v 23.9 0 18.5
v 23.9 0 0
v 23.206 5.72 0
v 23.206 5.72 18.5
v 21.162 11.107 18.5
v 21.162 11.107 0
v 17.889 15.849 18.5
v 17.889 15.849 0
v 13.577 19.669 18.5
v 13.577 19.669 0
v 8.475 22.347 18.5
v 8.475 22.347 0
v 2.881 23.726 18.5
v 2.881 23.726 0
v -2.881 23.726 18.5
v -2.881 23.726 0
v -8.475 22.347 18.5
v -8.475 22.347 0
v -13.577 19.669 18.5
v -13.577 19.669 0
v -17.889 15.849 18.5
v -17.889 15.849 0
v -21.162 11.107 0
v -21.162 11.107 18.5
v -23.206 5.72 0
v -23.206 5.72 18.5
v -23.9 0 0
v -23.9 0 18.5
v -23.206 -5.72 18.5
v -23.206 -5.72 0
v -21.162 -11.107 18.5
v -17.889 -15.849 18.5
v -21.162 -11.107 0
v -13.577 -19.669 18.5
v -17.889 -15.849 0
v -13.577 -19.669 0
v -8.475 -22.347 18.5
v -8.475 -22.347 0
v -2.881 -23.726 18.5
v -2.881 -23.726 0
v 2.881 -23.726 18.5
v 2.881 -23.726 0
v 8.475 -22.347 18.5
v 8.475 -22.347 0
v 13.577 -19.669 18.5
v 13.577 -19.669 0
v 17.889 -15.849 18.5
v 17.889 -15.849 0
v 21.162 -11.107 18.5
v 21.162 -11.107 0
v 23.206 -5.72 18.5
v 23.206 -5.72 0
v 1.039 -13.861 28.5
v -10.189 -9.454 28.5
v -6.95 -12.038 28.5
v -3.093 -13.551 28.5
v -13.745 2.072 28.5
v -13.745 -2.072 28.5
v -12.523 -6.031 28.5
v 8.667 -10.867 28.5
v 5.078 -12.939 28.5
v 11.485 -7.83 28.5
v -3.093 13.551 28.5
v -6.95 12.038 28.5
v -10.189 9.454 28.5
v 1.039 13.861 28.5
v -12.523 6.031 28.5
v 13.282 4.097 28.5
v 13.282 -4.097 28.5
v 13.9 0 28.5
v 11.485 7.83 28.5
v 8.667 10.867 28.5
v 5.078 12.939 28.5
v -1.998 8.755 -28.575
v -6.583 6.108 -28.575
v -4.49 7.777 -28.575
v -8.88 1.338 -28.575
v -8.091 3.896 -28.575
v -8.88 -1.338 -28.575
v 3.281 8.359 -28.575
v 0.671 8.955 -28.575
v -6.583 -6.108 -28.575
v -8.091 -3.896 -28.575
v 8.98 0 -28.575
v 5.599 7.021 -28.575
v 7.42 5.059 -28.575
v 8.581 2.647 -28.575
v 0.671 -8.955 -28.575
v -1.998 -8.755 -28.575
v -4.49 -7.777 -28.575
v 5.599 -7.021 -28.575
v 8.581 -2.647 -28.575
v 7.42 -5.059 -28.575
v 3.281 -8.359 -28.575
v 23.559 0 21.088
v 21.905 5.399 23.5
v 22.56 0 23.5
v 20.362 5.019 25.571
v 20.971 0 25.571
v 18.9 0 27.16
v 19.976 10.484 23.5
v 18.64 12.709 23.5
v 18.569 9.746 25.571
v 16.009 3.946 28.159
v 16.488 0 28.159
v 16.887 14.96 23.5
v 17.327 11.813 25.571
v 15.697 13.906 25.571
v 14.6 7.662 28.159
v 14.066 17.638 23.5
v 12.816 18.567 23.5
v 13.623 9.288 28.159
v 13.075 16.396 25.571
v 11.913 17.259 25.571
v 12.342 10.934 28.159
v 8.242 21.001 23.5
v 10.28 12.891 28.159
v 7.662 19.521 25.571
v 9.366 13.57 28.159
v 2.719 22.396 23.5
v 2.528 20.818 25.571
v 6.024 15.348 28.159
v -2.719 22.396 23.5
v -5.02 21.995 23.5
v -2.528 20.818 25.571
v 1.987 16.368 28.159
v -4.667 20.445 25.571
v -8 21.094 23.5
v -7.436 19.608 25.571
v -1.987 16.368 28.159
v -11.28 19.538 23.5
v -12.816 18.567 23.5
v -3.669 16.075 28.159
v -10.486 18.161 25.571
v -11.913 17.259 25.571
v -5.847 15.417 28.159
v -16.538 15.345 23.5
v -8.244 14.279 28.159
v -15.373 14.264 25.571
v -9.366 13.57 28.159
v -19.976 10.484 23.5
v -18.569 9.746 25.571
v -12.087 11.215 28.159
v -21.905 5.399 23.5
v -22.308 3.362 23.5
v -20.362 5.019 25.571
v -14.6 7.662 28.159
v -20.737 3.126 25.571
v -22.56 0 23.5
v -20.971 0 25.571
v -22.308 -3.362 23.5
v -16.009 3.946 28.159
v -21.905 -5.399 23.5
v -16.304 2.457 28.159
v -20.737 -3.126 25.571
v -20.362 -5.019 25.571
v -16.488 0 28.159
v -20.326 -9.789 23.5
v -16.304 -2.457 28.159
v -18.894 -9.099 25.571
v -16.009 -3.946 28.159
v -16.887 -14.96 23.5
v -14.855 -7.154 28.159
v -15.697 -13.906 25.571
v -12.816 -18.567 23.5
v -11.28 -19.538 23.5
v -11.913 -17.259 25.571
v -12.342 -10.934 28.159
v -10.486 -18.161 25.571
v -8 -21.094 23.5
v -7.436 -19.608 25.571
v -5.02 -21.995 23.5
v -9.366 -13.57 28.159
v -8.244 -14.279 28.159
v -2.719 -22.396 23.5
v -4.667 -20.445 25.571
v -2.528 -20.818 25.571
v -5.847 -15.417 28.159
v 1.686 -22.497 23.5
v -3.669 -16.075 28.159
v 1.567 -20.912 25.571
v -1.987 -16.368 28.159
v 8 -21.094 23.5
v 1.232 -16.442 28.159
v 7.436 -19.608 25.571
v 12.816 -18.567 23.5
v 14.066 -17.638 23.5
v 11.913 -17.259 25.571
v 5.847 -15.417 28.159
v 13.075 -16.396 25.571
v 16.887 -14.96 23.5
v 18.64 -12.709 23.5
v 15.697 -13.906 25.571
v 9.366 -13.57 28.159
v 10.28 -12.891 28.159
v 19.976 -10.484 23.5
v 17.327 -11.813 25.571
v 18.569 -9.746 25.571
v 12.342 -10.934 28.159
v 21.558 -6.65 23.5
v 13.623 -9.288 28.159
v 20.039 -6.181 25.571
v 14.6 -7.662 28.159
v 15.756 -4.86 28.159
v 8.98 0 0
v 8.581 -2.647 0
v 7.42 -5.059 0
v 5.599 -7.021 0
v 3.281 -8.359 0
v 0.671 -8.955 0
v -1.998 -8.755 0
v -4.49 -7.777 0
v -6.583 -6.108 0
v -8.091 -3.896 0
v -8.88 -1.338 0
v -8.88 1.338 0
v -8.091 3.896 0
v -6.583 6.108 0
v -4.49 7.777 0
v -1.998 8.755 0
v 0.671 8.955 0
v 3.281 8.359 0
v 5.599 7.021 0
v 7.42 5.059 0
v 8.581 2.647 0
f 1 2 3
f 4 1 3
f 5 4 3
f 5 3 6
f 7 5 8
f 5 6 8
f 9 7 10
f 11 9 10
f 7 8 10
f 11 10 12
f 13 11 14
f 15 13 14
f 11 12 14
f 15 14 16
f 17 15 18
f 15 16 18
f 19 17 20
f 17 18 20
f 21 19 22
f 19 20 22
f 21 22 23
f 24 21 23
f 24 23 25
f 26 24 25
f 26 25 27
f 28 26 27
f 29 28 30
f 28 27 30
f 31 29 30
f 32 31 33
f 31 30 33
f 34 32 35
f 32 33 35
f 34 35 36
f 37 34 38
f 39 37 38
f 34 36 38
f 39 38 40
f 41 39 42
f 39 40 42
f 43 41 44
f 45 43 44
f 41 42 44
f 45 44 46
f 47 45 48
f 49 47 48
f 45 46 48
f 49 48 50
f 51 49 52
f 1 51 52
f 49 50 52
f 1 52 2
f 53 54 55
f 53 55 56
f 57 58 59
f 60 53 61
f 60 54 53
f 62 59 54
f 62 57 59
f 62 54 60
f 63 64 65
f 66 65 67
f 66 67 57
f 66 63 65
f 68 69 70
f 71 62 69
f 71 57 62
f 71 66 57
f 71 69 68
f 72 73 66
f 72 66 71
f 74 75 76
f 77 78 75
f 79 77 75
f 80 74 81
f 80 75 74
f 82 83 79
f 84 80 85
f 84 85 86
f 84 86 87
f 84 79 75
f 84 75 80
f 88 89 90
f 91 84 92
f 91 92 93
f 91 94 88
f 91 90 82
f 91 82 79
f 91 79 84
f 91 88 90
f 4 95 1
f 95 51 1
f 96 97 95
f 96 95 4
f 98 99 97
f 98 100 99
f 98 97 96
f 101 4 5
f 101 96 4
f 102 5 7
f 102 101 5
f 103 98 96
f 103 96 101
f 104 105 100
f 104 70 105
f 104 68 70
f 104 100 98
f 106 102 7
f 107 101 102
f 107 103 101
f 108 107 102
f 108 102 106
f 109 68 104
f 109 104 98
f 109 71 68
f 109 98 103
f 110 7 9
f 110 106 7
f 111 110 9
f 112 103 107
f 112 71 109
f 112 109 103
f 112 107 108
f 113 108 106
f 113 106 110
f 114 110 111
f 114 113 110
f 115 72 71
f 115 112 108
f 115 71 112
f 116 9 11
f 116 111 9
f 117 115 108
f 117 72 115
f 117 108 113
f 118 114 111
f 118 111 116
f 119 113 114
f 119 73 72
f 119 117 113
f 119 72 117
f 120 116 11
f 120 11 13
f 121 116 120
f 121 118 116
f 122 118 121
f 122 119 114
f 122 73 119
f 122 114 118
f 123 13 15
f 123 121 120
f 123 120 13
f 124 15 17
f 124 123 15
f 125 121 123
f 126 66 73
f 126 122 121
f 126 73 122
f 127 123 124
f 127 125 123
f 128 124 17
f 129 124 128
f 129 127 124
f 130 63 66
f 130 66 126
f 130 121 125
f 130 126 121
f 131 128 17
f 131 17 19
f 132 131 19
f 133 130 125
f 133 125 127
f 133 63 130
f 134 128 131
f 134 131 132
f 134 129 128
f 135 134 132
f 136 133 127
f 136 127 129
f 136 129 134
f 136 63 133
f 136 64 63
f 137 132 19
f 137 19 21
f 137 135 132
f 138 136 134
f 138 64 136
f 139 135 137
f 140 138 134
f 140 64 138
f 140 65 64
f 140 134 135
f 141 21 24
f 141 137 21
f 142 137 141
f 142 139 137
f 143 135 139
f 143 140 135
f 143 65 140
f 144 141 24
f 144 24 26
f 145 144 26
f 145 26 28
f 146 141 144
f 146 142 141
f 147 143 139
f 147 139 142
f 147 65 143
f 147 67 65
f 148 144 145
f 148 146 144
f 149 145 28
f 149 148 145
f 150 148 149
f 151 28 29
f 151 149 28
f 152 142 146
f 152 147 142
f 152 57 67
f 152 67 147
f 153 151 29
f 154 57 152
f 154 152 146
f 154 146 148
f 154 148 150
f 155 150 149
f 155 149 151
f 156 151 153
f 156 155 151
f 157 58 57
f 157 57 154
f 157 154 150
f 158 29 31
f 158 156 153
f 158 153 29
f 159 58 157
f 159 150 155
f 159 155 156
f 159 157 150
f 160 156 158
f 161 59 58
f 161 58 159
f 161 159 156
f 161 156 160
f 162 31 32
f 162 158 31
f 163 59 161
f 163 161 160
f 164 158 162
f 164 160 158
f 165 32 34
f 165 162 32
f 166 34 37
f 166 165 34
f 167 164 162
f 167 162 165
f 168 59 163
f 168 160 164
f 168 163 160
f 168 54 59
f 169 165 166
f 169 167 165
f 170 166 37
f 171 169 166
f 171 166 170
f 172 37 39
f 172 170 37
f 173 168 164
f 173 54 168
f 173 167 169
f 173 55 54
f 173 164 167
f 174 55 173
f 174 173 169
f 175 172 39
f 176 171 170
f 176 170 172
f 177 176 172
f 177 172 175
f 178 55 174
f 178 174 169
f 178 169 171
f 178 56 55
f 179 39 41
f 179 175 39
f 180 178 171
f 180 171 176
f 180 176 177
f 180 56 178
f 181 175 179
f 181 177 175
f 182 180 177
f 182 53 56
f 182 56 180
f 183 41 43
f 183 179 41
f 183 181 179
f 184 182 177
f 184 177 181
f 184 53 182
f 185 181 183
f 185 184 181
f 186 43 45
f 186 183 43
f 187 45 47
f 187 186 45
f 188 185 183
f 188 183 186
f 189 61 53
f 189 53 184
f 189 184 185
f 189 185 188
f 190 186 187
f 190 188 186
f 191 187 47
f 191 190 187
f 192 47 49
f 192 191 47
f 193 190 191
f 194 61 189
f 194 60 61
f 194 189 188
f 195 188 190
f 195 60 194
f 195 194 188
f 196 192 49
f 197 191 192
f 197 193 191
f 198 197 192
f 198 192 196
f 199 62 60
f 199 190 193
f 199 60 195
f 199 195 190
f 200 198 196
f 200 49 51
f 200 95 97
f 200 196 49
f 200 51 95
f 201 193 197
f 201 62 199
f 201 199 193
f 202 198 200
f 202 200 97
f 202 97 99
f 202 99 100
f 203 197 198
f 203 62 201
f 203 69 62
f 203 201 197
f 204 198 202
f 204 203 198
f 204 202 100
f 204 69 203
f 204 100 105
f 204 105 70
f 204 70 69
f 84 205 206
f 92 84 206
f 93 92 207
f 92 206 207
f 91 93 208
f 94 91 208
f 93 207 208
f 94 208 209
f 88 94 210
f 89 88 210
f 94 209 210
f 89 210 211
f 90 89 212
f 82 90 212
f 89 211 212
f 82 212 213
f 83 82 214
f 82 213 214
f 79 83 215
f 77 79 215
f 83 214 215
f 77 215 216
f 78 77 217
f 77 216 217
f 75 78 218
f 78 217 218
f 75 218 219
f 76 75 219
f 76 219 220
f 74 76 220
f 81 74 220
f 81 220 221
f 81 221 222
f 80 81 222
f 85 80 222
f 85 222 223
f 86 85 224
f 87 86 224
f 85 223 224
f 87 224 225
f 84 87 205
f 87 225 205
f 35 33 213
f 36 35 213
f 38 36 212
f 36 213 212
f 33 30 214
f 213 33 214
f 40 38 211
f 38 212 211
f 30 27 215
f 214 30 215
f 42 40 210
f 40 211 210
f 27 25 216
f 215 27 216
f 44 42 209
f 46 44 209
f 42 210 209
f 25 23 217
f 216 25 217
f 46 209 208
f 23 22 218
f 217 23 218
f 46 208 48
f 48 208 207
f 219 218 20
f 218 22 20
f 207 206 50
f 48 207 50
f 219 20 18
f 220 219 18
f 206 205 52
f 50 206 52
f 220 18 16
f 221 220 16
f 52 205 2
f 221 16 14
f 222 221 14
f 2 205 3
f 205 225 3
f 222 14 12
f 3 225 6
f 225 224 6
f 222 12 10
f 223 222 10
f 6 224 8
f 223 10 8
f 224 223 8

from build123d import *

# Parameters (mm, degrees)
F0_R     = 23.9
F1_DEPTH = 28.5
F2_R     = 8.98
F3_DEPTH = 28.575
F4_R     = 10


# Not quite as in the source:
# - a length typed as a fraction of an inch, garbled in the dataset ("3 / 203.2 mm" for 3/8 in), is restored


with BuildPart() as f1:
    # F0 (on Top) → F1 (new body)
    with BuildSketch(Plane.XY):
        Circle(F0_R)
    extrude(amount=F1_DEPTH)

    # F2 (on face) → F3 (join)
    with BuildSketch(Plane(origin=(0, 0, 0), x_dir=(1, 0, 0), z_dir=(0, 0, -1))):
        Circle(F2_R)
    extrude(amount=F3_DEPTH)

    # F4
    f4_edges = [f1.edges().sort_by_distance(p)[0] for p in [
        (-23.9, 0, 28.5),
    ]]
    fillet(f4_edges, radius=F4_R)


solid = f1.part
